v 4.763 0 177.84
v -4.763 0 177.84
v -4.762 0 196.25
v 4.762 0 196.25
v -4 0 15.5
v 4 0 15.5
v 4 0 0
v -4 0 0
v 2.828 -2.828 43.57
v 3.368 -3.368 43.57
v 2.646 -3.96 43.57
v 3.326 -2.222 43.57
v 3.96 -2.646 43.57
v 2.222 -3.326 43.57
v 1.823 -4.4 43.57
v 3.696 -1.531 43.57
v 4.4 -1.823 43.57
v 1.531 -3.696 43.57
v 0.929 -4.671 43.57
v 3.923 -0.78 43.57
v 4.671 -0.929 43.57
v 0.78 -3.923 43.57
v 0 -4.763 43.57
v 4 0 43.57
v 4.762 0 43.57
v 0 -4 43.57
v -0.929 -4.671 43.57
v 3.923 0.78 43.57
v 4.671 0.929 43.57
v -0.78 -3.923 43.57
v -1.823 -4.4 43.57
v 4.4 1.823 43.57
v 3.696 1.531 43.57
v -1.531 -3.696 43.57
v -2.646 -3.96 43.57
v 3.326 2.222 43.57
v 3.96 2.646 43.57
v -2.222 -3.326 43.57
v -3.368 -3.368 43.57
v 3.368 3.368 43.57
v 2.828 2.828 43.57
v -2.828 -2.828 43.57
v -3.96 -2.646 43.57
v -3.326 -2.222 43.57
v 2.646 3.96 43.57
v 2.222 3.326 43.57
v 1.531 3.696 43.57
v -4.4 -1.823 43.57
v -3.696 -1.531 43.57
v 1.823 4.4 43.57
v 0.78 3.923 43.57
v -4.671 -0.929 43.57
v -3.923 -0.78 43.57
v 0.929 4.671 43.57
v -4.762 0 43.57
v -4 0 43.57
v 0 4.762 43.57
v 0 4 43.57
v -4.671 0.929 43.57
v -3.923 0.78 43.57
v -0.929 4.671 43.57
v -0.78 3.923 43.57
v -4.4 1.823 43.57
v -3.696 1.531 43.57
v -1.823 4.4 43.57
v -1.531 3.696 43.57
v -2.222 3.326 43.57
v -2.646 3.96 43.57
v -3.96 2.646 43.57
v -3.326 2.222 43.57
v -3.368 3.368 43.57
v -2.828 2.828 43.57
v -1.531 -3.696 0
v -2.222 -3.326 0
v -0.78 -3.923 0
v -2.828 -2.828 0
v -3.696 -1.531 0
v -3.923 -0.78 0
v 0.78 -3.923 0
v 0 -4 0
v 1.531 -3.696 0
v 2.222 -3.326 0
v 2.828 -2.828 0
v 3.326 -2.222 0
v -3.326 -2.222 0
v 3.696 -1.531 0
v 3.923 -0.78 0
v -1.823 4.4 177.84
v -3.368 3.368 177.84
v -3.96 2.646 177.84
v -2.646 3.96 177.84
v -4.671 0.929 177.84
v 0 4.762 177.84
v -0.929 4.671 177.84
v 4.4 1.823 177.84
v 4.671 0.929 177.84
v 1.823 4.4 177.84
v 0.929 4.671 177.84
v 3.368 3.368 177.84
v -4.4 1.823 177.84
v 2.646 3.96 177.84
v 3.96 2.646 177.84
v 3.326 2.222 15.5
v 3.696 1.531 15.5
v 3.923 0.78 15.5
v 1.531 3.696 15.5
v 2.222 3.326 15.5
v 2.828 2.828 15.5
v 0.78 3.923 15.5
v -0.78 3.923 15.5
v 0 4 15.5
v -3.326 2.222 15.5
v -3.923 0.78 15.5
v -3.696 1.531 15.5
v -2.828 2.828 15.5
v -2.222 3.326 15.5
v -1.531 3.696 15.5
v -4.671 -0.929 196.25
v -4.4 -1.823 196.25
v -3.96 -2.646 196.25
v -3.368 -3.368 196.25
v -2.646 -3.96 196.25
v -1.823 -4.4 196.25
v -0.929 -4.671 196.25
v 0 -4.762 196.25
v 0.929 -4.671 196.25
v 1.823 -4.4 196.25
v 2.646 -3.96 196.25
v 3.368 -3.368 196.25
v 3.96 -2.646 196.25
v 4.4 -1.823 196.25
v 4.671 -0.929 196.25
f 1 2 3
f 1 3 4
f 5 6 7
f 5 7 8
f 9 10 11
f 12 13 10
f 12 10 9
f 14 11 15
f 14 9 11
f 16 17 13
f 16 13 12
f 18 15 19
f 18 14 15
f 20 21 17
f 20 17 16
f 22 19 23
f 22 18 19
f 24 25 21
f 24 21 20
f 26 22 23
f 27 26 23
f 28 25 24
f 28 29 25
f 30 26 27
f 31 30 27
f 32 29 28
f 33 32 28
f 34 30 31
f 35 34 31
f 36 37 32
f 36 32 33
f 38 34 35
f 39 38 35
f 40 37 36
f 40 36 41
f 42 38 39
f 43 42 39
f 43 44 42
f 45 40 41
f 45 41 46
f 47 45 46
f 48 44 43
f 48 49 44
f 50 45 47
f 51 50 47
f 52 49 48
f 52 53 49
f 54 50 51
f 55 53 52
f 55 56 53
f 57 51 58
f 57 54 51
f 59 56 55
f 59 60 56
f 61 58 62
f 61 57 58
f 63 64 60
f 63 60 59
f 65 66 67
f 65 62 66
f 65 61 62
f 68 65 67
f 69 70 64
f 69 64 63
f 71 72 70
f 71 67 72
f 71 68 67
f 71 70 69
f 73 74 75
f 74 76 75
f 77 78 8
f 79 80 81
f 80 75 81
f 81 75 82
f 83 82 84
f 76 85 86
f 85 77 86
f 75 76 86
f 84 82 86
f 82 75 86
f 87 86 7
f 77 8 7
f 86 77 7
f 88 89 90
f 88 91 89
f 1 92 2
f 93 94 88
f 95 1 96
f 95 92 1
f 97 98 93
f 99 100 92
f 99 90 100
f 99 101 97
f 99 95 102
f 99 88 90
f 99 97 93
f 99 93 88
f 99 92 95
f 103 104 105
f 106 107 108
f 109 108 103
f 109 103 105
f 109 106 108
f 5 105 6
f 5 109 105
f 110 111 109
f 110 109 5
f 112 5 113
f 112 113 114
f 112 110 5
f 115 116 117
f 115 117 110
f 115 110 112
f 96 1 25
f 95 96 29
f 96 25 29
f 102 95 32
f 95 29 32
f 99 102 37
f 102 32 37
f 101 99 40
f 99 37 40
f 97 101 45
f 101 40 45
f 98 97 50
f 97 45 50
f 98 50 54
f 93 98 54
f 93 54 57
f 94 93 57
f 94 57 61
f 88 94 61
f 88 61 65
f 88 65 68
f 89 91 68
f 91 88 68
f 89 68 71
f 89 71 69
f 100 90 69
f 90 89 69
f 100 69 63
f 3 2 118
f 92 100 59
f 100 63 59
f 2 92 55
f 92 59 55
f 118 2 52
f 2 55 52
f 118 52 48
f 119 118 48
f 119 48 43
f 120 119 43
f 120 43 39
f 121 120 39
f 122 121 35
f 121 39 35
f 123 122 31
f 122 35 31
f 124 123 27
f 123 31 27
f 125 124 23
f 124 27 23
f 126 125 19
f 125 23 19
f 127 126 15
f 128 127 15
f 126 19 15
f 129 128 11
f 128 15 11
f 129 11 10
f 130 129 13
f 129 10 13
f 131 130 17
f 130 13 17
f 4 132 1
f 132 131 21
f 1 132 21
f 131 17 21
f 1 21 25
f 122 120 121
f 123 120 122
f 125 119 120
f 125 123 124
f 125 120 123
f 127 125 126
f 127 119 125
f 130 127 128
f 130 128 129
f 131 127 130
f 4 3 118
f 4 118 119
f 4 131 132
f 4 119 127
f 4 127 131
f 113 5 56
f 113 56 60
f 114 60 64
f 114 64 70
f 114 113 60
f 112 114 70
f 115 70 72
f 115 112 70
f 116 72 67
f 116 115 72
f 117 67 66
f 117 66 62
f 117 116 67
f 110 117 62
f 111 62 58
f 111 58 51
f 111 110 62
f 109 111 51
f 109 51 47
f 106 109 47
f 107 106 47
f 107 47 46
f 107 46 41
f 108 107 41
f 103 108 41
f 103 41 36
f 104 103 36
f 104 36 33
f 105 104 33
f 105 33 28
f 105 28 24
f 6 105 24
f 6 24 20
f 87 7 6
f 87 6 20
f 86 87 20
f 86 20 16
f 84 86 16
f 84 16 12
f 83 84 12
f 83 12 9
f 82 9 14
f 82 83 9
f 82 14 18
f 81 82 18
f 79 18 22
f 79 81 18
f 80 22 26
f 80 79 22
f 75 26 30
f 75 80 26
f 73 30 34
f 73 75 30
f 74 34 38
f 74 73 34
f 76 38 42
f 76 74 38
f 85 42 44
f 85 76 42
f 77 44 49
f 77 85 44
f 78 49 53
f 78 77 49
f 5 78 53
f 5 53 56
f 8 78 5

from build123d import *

# Parameters (mm, degrees)
SKETCH1_R           = 4.7625
BOSS_EXTRUDE1_DEPTH = 196.25
CUT_EXTRUDE1_DEPTH  = 18.41
SKETCH3_R           = 4.7625
SKETCH3_R_2         = 4
CUT_EXTRUDE2_DEPTH  = 43.57
CUT_EXTRUDE3_DEPTH  = 15.5


with BuildPart() as part:
    # Sketch1 → Boss-Extrude1 (new body)
    with BuildSketch(Plane.XY):
        Circle(SKETCH1_R)
    extrude(amount=BOSS_EXTRUDE1_DEPTH)

    # Sketch2 → Cut-Extrude1 (cut)
    with BuildSketch(Plane.XY.offset(196.25)):
        Polygon((-36.061047486, 0), (-4.7625, 0), (4.7625, 0), (36.061047486, 0), (36.061047486, 62.597094971), (-36.061047486, 62.597094971), align=None)
    extrude(amount=-CUT_EXTRUDE1_DEPTH, mode=Mode.SUBTRACT)

    # Sketch3 → Cut-Extrude2 (cut)
    with BuildSketch(Plane(origin=(0, 0, 0), x_dir=(-1, 0, 0), z_dir=(0, 0, -1))):
        Circle(SKETCH3_R)
        Circle(SKETCH3_R_2, mode=Mode.SUBTRACT)
    extrude(amount=-CUT_EXTRUDE2_DEPTH, mode=Mode.SUBTRACT)

    # Sketch4 → Cut-Extrude3 (cut)
    with BuildSketch(Plane(origin=(0, 0, 0), x_dir=(-1, 0, 0), z_dir=(0, 0, -1))):
        Polygon((-33.946208913, 0), (-4, 0), (4, 0), (33.946208913, 0), (33.946208913, 59.892417826), (-33.946208913, 59.892417826), align=None)
    extrude(amount=-CUT_EXTRUDE3_DEPTH, mode=Mode.SUBTRACT)


solid = part.part
